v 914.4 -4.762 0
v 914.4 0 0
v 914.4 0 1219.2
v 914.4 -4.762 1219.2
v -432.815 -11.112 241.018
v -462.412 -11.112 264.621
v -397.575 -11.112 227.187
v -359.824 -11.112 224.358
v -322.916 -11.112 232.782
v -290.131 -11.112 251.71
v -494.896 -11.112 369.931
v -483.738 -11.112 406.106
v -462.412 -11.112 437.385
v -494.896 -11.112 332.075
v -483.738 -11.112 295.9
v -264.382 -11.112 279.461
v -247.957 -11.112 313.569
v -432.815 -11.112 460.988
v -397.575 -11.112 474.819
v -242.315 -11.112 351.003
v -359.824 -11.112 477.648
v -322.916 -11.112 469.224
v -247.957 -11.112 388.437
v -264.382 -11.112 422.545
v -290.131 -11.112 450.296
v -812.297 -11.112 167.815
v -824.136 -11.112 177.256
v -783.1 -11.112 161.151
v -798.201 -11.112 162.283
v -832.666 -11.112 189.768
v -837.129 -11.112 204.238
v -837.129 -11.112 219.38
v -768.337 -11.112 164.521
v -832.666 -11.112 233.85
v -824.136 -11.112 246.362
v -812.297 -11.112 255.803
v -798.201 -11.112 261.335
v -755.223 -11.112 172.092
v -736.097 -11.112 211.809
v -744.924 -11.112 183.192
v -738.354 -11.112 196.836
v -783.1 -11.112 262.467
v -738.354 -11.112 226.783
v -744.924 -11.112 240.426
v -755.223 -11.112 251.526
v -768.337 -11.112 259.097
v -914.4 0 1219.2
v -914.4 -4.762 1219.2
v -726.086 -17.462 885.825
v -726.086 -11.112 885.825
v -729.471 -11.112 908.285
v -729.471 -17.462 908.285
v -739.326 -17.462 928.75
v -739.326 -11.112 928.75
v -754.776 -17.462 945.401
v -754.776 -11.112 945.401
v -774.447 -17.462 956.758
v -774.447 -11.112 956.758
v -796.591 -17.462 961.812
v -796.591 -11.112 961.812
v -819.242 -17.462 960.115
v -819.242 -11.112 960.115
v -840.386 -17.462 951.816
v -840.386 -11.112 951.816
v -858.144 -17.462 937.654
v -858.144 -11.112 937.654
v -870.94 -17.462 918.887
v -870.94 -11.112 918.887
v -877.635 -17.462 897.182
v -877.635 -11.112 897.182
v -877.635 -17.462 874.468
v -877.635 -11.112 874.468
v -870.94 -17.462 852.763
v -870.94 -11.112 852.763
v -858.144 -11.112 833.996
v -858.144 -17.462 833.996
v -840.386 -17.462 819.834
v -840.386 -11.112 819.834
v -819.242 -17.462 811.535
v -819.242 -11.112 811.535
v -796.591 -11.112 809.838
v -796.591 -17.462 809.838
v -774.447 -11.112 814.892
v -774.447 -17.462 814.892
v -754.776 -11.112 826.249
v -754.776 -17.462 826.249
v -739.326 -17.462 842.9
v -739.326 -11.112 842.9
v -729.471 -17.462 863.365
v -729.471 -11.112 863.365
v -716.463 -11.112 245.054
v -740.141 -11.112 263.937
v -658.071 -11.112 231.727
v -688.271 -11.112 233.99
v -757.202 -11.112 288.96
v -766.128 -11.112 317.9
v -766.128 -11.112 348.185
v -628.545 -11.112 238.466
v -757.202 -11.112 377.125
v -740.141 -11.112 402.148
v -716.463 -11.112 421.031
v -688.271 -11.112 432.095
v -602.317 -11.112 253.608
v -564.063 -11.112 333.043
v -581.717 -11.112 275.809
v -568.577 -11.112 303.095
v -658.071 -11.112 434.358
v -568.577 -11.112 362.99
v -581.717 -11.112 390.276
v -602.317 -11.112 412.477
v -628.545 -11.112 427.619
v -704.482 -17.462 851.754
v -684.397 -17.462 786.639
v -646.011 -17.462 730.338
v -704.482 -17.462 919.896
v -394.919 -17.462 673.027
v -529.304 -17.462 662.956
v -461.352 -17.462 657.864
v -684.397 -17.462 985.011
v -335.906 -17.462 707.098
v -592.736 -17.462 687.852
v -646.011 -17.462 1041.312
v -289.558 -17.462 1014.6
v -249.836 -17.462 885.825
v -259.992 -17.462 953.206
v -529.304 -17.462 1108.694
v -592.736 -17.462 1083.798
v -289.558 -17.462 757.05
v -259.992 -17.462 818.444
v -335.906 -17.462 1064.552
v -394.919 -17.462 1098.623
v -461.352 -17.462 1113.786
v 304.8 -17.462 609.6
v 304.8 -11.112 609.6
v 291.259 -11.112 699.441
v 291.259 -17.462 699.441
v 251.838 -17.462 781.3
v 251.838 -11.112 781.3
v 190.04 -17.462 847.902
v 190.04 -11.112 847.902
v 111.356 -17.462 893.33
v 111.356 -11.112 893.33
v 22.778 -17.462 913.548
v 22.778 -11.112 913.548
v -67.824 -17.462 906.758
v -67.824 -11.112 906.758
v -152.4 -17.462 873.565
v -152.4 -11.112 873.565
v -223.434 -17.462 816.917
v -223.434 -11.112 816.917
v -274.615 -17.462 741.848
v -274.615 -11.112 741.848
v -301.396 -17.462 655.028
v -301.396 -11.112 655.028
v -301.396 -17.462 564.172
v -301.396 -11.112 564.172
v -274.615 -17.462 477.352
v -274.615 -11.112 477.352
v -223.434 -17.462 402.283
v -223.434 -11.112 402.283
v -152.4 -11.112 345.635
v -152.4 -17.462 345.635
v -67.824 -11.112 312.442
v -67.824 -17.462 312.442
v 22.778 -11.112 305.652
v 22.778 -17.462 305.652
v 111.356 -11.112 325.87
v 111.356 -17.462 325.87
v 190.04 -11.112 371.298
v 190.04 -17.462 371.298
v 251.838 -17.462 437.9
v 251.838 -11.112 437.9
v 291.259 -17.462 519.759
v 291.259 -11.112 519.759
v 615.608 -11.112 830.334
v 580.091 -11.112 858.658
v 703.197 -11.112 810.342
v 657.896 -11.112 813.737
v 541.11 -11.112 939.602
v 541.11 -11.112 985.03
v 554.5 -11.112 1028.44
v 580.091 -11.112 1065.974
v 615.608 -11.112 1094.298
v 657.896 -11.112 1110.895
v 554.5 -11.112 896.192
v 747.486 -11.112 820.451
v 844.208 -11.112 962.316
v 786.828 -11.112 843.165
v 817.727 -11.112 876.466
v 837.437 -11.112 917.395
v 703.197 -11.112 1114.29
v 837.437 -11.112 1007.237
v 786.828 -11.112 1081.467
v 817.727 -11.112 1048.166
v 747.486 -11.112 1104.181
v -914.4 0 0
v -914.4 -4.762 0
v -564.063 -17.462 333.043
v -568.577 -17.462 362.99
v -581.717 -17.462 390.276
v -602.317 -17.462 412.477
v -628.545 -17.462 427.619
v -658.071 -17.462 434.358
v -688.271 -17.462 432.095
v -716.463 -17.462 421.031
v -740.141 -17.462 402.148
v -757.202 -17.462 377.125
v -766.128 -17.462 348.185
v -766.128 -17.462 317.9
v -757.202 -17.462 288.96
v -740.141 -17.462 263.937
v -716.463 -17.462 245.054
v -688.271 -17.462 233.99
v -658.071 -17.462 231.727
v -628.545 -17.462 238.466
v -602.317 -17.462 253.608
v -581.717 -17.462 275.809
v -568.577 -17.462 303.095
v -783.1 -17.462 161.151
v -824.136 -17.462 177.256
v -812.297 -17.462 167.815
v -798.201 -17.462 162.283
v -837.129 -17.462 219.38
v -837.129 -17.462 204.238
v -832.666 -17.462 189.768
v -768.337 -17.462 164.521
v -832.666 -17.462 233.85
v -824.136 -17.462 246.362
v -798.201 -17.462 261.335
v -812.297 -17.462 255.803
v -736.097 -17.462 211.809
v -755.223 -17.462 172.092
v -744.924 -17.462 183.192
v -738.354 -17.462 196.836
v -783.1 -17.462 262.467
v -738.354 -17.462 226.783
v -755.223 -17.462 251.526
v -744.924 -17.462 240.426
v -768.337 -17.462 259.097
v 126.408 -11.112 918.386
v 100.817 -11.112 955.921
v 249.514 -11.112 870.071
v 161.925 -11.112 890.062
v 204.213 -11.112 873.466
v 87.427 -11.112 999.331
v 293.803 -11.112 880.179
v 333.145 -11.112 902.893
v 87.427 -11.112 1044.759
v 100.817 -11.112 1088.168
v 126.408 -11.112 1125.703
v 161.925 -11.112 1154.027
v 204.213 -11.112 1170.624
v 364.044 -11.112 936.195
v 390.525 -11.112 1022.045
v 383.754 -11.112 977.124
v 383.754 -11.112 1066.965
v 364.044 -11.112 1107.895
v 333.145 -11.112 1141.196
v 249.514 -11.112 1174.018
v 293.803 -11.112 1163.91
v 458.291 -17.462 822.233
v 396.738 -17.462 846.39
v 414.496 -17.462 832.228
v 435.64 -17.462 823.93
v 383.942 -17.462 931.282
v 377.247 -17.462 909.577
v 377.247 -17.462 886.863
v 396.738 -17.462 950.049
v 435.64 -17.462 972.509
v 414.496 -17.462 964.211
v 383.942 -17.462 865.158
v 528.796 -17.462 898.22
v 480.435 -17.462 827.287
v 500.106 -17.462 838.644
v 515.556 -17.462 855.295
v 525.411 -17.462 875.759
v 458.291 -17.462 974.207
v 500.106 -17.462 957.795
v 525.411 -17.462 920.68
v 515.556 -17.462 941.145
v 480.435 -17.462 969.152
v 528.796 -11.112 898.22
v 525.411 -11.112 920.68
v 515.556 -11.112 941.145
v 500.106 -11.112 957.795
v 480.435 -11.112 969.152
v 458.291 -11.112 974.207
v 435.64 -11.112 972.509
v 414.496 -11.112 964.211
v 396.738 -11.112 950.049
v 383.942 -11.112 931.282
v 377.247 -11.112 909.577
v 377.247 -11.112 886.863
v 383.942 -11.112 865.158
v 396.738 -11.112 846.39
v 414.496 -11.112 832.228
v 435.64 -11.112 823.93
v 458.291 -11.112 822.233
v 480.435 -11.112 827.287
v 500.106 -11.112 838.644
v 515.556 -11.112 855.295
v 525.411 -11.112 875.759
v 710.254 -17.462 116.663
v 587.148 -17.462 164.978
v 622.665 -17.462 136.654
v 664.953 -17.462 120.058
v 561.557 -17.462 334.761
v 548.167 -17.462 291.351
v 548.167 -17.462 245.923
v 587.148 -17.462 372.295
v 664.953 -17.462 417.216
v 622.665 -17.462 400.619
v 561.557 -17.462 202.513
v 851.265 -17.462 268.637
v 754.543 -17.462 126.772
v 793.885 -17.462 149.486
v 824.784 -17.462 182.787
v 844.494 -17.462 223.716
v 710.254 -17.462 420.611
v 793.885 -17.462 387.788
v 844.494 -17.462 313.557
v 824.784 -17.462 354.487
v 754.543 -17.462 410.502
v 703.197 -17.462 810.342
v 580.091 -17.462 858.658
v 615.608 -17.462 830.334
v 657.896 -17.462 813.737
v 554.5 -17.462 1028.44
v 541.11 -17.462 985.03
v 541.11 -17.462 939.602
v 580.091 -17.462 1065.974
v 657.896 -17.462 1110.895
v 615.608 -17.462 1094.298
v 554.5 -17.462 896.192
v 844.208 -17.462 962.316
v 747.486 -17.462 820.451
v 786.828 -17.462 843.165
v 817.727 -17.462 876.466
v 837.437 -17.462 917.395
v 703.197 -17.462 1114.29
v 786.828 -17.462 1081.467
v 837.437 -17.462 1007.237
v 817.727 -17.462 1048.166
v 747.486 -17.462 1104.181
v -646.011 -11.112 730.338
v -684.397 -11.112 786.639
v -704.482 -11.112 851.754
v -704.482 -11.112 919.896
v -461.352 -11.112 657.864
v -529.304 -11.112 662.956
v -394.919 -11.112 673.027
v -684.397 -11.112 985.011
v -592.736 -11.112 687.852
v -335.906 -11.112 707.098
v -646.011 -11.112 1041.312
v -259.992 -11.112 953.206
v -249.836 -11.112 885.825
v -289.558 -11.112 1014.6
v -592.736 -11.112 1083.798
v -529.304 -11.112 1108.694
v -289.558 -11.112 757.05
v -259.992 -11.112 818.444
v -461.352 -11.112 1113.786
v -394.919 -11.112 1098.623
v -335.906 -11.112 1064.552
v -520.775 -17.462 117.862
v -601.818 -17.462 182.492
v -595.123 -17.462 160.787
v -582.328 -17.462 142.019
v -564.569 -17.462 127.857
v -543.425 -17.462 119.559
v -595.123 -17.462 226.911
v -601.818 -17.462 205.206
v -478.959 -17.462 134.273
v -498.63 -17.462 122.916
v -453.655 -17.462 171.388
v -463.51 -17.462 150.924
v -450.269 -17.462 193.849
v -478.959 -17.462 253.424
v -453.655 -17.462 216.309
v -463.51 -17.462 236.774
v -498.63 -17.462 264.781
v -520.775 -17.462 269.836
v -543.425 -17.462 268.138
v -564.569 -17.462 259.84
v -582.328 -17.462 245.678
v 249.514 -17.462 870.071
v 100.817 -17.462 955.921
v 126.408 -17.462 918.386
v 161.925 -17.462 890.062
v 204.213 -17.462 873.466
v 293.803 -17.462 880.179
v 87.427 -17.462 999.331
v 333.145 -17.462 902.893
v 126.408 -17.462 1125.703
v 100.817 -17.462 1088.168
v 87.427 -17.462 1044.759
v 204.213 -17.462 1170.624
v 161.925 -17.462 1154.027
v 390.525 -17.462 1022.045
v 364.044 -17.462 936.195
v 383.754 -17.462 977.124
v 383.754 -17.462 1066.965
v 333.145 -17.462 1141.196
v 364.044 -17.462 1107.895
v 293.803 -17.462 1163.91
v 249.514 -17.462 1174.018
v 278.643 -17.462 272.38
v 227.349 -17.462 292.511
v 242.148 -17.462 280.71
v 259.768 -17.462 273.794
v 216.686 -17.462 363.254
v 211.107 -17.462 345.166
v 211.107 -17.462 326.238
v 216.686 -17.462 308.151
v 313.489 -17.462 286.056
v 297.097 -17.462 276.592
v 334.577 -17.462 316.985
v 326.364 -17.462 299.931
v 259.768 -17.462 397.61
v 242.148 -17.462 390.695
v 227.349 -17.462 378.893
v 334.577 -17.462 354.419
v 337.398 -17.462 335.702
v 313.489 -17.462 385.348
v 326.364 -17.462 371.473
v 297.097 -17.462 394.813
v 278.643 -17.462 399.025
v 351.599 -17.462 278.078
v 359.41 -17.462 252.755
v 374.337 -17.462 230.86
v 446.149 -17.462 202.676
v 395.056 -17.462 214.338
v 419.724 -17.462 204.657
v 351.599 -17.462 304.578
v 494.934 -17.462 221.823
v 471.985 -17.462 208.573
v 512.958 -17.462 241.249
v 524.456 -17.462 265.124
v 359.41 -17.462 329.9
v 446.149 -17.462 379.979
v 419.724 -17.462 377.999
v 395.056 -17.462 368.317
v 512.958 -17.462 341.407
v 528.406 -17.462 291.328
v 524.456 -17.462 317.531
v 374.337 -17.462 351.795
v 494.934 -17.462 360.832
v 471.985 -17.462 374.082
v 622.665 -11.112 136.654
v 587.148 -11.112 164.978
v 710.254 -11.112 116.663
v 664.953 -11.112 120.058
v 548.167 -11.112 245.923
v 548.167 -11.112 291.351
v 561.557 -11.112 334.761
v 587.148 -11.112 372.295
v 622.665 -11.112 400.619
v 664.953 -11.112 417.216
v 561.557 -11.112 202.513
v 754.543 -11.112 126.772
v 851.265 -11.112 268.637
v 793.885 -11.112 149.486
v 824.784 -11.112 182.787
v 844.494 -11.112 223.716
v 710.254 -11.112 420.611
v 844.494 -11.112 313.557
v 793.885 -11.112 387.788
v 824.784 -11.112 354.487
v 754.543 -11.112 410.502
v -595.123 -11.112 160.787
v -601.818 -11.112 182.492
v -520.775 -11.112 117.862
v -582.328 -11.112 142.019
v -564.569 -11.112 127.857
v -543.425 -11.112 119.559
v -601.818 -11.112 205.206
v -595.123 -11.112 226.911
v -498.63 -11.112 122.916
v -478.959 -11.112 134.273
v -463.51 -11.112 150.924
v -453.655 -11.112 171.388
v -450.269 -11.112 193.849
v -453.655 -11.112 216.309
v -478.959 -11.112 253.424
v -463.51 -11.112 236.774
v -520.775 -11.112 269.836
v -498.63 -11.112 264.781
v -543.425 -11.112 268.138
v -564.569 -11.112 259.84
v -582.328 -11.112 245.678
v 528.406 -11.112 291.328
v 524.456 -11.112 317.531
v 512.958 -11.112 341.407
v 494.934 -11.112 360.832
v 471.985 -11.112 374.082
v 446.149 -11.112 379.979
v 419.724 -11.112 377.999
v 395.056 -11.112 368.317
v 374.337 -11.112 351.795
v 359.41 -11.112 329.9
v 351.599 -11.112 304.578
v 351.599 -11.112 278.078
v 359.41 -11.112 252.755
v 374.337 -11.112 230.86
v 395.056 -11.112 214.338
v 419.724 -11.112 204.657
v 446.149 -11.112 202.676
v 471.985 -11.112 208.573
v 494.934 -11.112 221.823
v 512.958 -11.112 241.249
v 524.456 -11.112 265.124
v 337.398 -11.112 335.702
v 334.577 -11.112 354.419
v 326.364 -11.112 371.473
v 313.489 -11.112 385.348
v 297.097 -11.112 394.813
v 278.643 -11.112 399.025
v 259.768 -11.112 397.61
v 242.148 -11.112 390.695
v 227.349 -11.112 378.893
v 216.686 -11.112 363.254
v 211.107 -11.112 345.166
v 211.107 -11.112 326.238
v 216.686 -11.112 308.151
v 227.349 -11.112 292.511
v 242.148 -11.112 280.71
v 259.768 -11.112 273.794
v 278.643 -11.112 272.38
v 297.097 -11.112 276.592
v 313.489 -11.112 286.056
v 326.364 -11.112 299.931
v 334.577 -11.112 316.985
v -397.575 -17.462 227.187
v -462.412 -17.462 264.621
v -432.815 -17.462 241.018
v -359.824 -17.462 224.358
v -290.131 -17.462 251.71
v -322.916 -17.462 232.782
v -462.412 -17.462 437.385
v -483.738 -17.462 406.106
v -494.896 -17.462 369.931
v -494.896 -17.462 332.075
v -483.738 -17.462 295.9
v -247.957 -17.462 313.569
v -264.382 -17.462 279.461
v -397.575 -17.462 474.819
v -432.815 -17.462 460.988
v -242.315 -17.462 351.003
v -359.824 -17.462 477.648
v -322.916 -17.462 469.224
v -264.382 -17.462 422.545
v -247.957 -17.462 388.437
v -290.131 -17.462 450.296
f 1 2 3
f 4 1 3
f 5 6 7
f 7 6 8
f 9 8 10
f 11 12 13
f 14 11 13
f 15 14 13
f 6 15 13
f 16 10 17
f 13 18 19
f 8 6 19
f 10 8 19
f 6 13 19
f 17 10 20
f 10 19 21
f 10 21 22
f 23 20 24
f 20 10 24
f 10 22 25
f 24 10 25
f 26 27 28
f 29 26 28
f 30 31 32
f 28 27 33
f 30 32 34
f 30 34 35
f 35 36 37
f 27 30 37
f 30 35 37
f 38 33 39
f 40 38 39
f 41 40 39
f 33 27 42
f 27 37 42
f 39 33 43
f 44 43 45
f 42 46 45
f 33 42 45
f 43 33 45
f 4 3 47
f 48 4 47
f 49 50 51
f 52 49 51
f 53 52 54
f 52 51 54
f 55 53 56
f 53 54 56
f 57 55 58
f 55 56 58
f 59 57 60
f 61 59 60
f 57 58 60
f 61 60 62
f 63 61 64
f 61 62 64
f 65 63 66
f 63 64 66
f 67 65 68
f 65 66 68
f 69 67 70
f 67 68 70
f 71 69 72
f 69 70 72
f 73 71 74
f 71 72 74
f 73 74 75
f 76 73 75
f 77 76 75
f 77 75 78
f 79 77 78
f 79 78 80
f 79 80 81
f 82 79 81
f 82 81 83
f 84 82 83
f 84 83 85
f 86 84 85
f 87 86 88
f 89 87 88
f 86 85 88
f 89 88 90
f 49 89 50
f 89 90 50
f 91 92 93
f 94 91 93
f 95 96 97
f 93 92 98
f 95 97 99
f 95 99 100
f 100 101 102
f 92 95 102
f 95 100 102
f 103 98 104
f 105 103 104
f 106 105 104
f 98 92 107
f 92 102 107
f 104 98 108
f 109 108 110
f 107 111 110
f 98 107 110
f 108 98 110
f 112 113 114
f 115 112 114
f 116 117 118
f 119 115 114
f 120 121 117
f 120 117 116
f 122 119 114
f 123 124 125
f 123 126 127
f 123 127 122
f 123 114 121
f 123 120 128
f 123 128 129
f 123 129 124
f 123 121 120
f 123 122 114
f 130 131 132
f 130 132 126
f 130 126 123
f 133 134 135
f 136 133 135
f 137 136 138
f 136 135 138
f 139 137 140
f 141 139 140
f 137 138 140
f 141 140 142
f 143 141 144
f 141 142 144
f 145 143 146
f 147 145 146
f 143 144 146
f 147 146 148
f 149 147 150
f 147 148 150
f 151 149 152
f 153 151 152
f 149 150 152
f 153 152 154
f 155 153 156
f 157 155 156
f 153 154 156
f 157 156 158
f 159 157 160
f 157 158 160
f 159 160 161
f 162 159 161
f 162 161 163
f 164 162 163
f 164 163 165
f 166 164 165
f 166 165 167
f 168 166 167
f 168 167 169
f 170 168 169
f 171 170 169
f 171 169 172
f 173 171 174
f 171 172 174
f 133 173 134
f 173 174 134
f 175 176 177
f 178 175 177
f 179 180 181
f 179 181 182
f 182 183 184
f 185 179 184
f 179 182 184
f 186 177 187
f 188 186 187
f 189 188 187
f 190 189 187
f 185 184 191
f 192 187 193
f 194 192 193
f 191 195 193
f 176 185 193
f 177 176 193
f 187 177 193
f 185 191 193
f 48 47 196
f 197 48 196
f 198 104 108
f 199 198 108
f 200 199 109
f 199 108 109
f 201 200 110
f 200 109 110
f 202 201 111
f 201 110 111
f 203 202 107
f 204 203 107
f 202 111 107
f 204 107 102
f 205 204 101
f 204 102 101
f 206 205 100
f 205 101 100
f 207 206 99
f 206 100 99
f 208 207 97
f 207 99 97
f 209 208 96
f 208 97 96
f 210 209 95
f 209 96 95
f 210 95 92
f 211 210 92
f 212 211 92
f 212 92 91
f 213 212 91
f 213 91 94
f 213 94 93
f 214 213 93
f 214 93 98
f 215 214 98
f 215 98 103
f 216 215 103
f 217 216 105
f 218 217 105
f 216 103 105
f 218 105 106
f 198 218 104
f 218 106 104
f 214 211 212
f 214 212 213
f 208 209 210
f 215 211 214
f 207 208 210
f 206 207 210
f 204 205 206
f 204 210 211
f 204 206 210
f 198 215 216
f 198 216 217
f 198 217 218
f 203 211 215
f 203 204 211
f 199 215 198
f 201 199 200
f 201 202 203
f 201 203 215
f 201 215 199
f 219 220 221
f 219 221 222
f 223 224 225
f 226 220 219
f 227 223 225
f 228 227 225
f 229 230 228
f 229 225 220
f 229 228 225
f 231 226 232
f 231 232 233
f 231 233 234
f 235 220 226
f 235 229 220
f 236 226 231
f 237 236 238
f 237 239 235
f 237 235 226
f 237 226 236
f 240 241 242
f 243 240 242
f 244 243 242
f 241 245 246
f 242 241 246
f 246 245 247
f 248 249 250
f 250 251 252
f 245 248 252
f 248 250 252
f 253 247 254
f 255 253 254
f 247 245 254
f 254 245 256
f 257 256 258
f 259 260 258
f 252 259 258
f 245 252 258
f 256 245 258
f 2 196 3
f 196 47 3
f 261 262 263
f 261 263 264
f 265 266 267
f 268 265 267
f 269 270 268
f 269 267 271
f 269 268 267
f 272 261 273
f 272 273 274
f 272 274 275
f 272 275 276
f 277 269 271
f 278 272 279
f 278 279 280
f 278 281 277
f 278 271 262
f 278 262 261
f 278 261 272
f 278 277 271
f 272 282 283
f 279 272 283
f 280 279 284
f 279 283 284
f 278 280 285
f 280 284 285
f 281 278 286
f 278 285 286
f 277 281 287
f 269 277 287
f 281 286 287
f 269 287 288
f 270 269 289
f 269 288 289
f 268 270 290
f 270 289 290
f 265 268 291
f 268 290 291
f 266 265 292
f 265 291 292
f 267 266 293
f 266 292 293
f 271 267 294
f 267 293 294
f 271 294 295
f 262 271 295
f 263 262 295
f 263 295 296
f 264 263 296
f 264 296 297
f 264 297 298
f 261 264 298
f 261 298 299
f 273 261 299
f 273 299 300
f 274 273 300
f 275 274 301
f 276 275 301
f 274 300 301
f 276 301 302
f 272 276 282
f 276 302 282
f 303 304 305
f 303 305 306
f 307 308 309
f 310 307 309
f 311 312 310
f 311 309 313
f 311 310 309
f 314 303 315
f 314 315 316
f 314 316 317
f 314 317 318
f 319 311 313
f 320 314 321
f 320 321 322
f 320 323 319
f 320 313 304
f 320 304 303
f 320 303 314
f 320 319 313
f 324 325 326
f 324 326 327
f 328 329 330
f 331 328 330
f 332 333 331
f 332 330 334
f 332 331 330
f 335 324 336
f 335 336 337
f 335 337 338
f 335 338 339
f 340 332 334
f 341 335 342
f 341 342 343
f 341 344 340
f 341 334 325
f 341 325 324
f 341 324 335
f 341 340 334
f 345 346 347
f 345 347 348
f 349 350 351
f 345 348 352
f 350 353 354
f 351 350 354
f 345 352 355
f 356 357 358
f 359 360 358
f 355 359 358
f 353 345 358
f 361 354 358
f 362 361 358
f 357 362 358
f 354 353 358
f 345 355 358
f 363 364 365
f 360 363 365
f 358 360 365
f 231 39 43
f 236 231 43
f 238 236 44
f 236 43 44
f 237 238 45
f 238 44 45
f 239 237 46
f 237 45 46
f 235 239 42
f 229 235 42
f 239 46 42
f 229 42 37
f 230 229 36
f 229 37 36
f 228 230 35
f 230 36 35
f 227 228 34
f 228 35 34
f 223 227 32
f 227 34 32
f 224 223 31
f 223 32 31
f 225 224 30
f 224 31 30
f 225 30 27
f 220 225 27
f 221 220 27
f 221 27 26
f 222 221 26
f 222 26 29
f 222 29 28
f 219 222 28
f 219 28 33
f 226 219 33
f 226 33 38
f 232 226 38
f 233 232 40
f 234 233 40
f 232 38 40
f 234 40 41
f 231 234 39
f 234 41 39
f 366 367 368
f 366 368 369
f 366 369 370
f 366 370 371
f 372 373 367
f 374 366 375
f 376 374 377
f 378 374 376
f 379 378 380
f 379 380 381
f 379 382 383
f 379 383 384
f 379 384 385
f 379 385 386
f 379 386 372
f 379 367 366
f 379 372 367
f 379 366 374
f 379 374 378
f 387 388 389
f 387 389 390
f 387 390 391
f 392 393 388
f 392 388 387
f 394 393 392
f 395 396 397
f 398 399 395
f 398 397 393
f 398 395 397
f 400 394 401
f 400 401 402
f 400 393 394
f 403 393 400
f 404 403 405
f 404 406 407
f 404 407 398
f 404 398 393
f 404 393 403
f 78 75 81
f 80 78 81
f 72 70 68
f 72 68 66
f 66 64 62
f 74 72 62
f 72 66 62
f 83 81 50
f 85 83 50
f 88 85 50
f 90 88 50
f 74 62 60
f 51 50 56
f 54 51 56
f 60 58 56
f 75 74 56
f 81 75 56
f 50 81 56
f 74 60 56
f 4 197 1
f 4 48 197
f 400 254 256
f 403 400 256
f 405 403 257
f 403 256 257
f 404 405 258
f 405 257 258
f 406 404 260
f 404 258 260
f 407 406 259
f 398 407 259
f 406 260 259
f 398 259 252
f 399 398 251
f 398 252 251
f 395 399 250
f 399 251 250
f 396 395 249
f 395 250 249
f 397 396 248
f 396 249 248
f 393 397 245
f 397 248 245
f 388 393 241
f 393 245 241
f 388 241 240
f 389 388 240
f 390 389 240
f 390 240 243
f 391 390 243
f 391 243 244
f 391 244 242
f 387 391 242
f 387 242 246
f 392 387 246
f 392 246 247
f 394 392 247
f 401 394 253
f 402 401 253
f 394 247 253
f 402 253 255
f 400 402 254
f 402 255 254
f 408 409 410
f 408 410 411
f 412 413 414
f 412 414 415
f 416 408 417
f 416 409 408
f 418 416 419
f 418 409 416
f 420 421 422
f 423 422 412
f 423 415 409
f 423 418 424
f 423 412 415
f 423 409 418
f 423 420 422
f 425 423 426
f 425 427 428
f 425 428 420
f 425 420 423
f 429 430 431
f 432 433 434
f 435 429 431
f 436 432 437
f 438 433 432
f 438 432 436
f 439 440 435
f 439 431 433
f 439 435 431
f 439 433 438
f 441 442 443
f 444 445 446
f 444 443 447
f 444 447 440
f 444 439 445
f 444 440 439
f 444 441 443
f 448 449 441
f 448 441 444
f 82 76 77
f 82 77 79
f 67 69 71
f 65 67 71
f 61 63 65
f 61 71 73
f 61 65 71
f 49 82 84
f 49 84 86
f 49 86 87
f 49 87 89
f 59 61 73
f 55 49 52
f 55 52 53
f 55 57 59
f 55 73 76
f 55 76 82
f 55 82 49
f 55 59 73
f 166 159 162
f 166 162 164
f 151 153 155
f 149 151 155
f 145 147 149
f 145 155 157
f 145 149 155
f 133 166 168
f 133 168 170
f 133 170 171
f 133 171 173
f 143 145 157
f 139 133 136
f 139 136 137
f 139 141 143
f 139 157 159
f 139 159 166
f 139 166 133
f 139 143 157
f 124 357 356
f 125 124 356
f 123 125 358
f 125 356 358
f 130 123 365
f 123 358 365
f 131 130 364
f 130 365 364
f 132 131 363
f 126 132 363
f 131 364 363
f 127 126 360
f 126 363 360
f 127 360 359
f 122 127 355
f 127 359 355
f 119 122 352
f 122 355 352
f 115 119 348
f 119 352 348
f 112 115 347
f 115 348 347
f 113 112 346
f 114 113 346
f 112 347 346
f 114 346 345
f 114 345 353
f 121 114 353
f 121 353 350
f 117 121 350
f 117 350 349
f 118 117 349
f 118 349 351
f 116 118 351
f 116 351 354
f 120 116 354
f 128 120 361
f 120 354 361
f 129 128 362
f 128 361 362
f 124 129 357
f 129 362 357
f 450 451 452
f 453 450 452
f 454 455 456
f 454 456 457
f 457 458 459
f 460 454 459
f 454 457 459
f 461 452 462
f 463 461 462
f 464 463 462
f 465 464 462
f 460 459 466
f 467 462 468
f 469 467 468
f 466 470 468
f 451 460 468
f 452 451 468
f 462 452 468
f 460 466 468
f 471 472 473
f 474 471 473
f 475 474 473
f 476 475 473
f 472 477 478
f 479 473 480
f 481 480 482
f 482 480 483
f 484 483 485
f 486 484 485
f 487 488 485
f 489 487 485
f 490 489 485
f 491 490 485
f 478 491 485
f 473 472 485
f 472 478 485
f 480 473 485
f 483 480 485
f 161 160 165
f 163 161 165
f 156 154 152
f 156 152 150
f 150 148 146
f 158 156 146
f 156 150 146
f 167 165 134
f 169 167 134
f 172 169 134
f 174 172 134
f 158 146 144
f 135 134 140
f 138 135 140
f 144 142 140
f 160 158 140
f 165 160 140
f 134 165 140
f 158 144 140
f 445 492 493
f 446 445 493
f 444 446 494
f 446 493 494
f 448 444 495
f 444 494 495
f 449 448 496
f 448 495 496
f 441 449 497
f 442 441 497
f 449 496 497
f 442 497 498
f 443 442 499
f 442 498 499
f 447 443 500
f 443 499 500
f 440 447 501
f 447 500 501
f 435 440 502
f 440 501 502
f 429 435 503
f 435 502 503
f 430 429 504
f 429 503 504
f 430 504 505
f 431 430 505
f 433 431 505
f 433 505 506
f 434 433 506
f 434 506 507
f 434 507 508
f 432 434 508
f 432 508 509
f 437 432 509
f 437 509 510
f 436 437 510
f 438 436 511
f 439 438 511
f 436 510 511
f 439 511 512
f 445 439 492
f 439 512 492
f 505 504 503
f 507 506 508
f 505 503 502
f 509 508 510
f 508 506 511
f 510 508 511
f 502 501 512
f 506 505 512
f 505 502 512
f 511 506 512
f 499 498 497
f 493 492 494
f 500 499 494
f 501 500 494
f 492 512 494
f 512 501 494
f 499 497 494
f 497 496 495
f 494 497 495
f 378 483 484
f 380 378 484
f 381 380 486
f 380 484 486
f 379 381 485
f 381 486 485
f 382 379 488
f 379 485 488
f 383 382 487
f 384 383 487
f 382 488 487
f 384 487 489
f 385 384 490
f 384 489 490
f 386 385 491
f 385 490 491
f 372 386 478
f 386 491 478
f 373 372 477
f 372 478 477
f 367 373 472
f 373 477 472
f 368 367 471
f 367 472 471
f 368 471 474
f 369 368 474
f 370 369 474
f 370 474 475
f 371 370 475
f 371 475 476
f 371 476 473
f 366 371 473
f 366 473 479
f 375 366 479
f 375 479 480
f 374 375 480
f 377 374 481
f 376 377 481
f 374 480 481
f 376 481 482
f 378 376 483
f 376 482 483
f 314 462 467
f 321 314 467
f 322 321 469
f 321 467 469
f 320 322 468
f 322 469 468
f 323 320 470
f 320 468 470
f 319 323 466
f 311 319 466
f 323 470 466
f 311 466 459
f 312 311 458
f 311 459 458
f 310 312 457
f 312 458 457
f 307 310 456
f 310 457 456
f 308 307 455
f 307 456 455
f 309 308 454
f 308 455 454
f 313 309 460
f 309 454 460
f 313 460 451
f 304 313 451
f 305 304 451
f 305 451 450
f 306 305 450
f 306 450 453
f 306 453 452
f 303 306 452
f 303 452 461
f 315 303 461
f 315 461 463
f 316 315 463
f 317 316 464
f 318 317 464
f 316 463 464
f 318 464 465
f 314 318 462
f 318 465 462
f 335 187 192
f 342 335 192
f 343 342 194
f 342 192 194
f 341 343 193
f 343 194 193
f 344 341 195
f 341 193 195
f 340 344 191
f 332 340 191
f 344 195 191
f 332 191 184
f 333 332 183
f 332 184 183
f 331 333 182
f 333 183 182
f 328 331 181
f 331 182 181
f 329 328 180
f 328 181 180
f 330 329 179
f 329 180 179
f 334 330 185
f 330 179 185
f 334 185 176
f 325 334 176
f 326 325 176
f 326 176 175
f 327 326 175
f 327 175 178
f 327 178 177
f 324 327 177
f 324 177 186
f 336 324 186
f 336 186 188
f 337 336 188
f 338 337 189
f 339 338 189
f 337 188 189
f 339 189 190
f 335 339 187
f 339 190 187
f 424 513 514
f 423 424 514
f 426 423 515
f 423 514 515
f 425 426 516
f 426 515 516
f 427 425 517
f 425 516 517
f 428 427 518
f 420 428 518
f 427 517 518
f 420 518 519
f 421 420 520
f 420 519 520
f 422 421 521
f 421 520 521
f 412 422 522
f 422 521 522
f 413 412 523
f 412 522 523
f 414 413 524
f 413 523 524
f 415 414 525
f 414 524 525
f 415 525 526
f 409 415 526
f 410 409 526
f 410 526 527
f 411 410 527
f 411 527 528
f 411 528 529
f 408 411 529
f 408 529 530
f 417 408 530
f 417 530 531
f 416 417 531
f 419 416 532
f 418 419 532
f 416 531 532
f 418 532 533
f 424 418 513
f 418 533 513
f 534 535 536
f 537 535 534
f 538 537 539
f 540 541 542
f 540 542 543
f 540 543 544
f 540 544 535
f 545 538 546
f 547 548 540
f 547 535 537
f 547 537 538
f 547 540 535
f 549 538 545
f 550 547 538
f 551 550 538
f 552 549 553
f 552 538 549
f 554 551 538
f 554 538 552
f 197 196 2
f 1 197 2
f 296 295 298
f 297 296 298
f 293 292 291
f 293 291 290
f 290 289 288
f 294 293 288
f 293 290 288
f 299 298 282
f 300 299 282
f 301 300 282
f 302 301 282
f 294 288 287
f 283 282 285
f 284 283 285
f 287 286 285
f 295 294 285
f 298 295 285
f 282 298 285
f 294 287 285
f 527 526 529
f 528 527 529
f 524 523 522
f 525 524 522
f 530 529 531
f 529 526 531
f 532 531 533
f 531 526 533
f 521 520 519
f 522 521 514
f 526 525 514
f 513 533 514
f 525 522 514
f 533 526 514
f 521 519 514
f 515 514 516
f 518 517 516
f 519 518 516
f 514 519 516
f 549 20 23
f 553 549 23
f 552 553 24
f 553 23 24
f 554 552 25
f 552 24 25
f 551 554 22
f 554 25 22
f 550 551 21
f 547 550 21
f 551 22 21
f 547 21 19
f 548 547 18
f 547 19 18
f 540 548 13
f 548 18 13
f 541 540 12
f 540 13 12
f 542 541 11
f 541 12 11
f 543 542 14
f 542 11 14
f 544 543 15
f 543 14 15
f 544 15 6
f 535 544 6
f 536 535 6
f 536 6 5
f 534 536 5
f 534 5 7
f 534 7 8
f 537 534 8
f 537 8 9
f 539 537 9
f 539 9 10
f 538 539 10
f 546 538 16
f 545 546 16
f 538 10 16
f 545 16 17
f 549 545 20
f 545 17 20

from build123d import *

# Parameters (mm, degrees)
F1_DEPTH = 4.7625
F3_R     = 304.8
F4_DEPTH = 6.35
F3_R_2   = 127
F3_R_3   = 76.2
F3_R_4   = 101.6
F3_R_5   = 50.8
F3_R_6   = 228.6
F3_R_7   = 63.5
F3_R_8   = 88.9
F3_R_9   = 152.4


with BuildPart() as f1:
    # F0 (on Front) → F1 (new body)
    with BuildSketch(Plane.XZ):
        Polygon((-914.4, 0), (0, 0), (914.4, 0), (914.4, 1219.2), (-914.4, 1219.2), align=None)
    extrude(amount=F1_DEPTH)


with BuildPart() as f4:
    # F3 (on offset) → F4 (new body)
    with BuildSketch(Plane.XZ.offset(11.1125)):
        with Locations((0, 609.6)):
            Circle(F3_R)
    extrude(amount=F4_DEPTH)


with BuildPart() as f4b:
    # F3 (on offset) → F4, piece 2 (new body)
    with BuildSketch(Plane.XZ.offset(11.1125)):
        with Locations((-369.3146991677, 351.0030636711)):
            Circle(F3_R_2)
    extrude(amount=F4_DEPTH)


with BuildPart() as f4c:
    # F3 (on offset) → F4, piece 3 (new body)
    with BuildSketch(Plane.XZ.offset(11.1125)):
        with Locations((-526.4691812864, 193.8485815524)):
            Circle(F3_R_3)
    extrude(amount=F4_DEPTH)


with BuildPart() as f4d:
    # F3 (on offset) → F4, piece 4 (new body)
    with BuildSketch(Plane.XZ.offset(11.1125)):
        with Locations((-665.663151163, 333.042551429)):
            Circle(F3_R_4)
    extrude(amount=F4_DEPTH)


with BuildPart() as f4e:
    # F3 (on offset) → F4, piece 5 (new body)
    with BuildSketch(Plane.XZ.offset(11.1125)):
        with Locations((-786.8966087974, 211.8090937946)):
            Circle(F3_R_5)
    extrude(amount=F4_DEPTH)


with BuildPart() as f4f:
    # F3 (on offset) → F4, piece 6 (new body)
    with BuildSketch(Plane.XZ.offset(11.1125)):
        with Locations((-802.2857343207, 885.825)):
            Circle(F3_R_3)
    extrude(amount=F4_DEPTH)


with BuildPart() as f4g:
    # F3 (on offset) → F4, piece 7 (new body)
    with BuildSketch(Plane.XZ.offset(11.1125)):
        with Locations((-478.4357343207, 885.825)):
            Circle(F3_R_6)
    extrude(amount=F4_DEPTH)


with BuildPart() as f4h:
    # F3 (on offset) → F4, piece 8 (new body)
    with BuildSketch(Plane.XZ.offset(11.1125)):
        with Locations((273.8978116926, 335.7021883074)):
            Circle(F3_R_7)
    extrude(amount=F4_DEPTH)


with BuildPart() as f4i:
    # F3 (on offset) → F4, piece 9 (new body)
    with BuildSketch(Plane.XZ.offset(11.1125)):
        with Locations((439.5057946099, 291.3276630246)):
            Circle(F3_R_8)
    extrude(amount=F4_DEPTH)


with BuildPart() as f4j:
    # F3 (on offset) → F4, piece 10 (new body)
    with BuildSketch(Plane.XZ.offset(11.1125)):
        with Locations((698.8650842581, 268.6366654002)):
            Circle(F3_R_9)
    extrude(amount=F4_DEPTH)


with BuildPart() as f4k:
    # F3 (on offset) → F4, piece 11 (new body)
    with BuildSketch(Plane.XZ.offset(11.1125)):
        with Locations((238.125, 1022.0445985523)):
            Circle(F3_R_9)
    extrude(amount=F4_DEPTH)


with BuildPart() as f4l:
    # F3 (on offset) → F4, piece 12 (new body)
    with BuildSketch(Plane.XZ.offset(11.1125)):
        with Locations((452.5961912472, 898.2195985523)):
            Circle(F3_R_3)
    extrude(amount=F4_DEPTH)


with BuildPart() as f4m:
    # F3 (on offset) → F4, piece 13 (new body)
    with BuildSketch(Plane.XZ.offset(11.1125)):
        with Locations((691.8077221277, 962.316135072)):
            Circle(F3_R_9)
    extrude(amount=F4_DEPTH)


solid = Compound([f1.part, f4.part, f4b.part, f4c.part, f4d.part, f4e.part, f4f.part, f4g.part, f4h.part, f4i.part, f4j.part, f4k.part, f4l.part, f4m.part])
